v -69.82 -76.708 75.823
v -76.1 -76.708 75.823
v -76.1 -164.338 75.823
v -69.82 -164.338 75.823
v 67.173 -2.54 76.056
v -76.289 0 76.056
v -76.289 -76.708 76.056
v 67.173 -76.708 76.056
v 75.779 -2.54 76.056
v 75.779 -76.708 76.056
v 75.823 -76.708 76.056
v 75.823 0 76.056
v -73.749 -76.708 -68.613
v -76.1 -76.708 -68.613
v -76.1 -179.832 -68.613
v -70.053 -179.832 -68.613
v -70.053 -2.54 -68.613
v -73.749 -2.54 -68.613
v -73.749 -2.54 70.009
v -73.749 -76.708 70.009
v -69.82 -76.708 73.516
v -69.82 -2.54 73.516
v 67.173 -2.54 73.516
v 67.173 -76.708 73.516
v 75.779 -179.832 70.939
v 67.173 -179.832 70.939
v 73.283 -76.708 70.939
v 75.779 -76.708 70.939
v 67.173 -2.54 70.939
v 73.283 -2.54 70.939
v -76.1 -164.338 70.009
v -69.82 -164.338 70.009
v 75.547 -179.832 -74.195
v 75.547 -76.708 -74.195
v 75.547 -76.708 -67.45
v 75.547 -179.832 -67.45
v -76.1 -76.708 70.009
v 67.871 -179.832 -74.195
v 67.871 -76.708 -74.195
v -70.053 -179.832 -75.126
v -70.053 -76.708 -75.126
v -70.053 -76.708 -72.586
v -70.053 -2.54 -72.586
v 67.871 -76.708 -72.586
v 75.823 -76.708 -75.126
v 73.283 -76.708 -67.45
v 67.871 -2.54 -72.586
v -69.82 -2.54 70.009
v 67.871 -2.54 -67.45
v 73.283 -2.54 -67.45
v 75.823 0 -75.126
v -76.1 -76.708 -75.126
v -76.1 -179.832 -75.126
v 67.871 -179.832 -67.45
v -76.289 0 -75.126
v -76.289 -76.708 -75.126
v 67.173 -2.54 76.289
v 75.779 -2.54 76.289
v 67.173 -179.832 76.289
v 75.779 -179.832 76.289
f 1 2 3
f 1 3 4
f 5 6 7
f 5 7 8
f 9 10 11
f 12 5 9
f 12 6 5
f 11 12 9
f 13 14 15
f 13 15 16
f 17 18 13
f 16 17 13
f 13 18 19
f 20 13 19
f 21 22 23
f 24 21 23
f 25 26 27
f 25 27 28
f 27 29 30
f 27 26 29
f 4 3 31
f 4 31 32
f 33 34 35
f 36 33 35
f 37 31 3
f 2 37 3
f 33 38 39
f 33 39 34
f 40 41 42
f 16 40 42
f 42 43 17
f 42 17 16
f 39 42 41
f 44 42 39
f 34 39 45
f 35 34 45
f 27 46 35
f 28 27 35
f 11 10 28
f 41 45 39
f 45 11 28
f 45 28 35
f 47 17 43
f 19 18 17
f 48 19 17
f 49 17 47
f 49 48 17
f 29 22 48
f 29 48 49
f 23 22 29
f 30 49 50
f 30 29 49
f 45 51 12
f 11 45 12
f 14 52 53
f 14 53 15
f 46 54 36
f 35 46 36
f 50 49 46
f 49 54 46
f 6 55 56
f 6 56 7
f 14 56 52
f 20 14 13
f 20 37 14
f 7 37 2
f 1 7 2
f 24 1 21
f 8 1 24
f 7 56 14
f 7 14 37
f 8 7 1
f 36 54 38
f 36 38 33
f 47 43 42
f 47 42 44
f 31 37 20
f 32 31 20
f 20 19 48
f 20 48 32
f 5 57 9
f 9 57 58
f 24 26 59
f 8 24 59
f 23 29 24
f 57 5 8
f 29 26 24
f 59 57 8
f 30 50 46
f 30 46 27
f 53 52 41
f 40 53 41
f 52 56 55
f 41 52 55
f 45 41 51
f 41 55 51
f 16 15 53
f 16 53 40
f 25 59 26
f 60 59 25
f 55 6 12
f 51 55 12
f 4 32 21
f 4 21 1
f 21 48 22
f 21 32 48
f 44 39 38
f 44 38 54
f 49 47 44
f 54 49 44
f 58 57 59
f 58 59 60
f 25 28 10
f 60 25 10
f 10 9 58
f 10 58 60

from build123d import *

# Parameters (mm, degrees)
F0_W     = 152.112037
F0_H     = 151.181682
F1_DEPTH = 76.708
F2_T     = -2.54
F3_W     = 6.279856
F3_H     = 5.814679
F4_DEPTH = 161.798
F6_W     = 7.675372
F6_H     = 6.745033
F5_W     = 6.047272
F5_H     = 6.51244
F7_W     = 8.605727
F7_H     = 5.349502
F8_DEPTH = 177.292


with BuildPart() as f1:
    # F0 (on Front) → F1 (new body)
    with BuildSketch(Plane.XZ):
        with Locations((-0.232585, 0.465177)):
            Rectangle(F0_W, F0_H)
    extrude(amount=F1_DEPTH)

    # F2
    f2_openings = [f1.faces().sort_by_distance(p)[0] for p in [
        (-0.232585, -76.708, 0.465177),
    ]]
    offset(amount=F2_T, openings=f2_openings)

    # F3 (on face) → F4 (join)
    with BuildSketch(Plane.XZ.offset(2.54)):
        with Locations((-72.960392, 72.916087)):
            Rectangle(F3_W, F3_H)
    extrude(amount=F4_DEPTH)

    # F6 (on face) + F5 (on face) + F7 (on face) → F8 (join)
    with BuildSketch(Plane.XZ.offset(2.54)):
        with Locations((71.708854, -70.822808)):
            Rectangle(F6_W, F6_H)
    with BuildSketch(Plane.XZ.offset(2.54)):
        with Locations((-73.076684, -71.869444)):
            Rectangle(F5_W, F5_H)
    with BuildSketch(Plane.XZ.offset(2.54)):
        with Locations((71.47627, 73.613852)):
            Rectangle(F7_W, F7_H)
    extrude(amount=F8_DEPTH)


solid = f1.part
